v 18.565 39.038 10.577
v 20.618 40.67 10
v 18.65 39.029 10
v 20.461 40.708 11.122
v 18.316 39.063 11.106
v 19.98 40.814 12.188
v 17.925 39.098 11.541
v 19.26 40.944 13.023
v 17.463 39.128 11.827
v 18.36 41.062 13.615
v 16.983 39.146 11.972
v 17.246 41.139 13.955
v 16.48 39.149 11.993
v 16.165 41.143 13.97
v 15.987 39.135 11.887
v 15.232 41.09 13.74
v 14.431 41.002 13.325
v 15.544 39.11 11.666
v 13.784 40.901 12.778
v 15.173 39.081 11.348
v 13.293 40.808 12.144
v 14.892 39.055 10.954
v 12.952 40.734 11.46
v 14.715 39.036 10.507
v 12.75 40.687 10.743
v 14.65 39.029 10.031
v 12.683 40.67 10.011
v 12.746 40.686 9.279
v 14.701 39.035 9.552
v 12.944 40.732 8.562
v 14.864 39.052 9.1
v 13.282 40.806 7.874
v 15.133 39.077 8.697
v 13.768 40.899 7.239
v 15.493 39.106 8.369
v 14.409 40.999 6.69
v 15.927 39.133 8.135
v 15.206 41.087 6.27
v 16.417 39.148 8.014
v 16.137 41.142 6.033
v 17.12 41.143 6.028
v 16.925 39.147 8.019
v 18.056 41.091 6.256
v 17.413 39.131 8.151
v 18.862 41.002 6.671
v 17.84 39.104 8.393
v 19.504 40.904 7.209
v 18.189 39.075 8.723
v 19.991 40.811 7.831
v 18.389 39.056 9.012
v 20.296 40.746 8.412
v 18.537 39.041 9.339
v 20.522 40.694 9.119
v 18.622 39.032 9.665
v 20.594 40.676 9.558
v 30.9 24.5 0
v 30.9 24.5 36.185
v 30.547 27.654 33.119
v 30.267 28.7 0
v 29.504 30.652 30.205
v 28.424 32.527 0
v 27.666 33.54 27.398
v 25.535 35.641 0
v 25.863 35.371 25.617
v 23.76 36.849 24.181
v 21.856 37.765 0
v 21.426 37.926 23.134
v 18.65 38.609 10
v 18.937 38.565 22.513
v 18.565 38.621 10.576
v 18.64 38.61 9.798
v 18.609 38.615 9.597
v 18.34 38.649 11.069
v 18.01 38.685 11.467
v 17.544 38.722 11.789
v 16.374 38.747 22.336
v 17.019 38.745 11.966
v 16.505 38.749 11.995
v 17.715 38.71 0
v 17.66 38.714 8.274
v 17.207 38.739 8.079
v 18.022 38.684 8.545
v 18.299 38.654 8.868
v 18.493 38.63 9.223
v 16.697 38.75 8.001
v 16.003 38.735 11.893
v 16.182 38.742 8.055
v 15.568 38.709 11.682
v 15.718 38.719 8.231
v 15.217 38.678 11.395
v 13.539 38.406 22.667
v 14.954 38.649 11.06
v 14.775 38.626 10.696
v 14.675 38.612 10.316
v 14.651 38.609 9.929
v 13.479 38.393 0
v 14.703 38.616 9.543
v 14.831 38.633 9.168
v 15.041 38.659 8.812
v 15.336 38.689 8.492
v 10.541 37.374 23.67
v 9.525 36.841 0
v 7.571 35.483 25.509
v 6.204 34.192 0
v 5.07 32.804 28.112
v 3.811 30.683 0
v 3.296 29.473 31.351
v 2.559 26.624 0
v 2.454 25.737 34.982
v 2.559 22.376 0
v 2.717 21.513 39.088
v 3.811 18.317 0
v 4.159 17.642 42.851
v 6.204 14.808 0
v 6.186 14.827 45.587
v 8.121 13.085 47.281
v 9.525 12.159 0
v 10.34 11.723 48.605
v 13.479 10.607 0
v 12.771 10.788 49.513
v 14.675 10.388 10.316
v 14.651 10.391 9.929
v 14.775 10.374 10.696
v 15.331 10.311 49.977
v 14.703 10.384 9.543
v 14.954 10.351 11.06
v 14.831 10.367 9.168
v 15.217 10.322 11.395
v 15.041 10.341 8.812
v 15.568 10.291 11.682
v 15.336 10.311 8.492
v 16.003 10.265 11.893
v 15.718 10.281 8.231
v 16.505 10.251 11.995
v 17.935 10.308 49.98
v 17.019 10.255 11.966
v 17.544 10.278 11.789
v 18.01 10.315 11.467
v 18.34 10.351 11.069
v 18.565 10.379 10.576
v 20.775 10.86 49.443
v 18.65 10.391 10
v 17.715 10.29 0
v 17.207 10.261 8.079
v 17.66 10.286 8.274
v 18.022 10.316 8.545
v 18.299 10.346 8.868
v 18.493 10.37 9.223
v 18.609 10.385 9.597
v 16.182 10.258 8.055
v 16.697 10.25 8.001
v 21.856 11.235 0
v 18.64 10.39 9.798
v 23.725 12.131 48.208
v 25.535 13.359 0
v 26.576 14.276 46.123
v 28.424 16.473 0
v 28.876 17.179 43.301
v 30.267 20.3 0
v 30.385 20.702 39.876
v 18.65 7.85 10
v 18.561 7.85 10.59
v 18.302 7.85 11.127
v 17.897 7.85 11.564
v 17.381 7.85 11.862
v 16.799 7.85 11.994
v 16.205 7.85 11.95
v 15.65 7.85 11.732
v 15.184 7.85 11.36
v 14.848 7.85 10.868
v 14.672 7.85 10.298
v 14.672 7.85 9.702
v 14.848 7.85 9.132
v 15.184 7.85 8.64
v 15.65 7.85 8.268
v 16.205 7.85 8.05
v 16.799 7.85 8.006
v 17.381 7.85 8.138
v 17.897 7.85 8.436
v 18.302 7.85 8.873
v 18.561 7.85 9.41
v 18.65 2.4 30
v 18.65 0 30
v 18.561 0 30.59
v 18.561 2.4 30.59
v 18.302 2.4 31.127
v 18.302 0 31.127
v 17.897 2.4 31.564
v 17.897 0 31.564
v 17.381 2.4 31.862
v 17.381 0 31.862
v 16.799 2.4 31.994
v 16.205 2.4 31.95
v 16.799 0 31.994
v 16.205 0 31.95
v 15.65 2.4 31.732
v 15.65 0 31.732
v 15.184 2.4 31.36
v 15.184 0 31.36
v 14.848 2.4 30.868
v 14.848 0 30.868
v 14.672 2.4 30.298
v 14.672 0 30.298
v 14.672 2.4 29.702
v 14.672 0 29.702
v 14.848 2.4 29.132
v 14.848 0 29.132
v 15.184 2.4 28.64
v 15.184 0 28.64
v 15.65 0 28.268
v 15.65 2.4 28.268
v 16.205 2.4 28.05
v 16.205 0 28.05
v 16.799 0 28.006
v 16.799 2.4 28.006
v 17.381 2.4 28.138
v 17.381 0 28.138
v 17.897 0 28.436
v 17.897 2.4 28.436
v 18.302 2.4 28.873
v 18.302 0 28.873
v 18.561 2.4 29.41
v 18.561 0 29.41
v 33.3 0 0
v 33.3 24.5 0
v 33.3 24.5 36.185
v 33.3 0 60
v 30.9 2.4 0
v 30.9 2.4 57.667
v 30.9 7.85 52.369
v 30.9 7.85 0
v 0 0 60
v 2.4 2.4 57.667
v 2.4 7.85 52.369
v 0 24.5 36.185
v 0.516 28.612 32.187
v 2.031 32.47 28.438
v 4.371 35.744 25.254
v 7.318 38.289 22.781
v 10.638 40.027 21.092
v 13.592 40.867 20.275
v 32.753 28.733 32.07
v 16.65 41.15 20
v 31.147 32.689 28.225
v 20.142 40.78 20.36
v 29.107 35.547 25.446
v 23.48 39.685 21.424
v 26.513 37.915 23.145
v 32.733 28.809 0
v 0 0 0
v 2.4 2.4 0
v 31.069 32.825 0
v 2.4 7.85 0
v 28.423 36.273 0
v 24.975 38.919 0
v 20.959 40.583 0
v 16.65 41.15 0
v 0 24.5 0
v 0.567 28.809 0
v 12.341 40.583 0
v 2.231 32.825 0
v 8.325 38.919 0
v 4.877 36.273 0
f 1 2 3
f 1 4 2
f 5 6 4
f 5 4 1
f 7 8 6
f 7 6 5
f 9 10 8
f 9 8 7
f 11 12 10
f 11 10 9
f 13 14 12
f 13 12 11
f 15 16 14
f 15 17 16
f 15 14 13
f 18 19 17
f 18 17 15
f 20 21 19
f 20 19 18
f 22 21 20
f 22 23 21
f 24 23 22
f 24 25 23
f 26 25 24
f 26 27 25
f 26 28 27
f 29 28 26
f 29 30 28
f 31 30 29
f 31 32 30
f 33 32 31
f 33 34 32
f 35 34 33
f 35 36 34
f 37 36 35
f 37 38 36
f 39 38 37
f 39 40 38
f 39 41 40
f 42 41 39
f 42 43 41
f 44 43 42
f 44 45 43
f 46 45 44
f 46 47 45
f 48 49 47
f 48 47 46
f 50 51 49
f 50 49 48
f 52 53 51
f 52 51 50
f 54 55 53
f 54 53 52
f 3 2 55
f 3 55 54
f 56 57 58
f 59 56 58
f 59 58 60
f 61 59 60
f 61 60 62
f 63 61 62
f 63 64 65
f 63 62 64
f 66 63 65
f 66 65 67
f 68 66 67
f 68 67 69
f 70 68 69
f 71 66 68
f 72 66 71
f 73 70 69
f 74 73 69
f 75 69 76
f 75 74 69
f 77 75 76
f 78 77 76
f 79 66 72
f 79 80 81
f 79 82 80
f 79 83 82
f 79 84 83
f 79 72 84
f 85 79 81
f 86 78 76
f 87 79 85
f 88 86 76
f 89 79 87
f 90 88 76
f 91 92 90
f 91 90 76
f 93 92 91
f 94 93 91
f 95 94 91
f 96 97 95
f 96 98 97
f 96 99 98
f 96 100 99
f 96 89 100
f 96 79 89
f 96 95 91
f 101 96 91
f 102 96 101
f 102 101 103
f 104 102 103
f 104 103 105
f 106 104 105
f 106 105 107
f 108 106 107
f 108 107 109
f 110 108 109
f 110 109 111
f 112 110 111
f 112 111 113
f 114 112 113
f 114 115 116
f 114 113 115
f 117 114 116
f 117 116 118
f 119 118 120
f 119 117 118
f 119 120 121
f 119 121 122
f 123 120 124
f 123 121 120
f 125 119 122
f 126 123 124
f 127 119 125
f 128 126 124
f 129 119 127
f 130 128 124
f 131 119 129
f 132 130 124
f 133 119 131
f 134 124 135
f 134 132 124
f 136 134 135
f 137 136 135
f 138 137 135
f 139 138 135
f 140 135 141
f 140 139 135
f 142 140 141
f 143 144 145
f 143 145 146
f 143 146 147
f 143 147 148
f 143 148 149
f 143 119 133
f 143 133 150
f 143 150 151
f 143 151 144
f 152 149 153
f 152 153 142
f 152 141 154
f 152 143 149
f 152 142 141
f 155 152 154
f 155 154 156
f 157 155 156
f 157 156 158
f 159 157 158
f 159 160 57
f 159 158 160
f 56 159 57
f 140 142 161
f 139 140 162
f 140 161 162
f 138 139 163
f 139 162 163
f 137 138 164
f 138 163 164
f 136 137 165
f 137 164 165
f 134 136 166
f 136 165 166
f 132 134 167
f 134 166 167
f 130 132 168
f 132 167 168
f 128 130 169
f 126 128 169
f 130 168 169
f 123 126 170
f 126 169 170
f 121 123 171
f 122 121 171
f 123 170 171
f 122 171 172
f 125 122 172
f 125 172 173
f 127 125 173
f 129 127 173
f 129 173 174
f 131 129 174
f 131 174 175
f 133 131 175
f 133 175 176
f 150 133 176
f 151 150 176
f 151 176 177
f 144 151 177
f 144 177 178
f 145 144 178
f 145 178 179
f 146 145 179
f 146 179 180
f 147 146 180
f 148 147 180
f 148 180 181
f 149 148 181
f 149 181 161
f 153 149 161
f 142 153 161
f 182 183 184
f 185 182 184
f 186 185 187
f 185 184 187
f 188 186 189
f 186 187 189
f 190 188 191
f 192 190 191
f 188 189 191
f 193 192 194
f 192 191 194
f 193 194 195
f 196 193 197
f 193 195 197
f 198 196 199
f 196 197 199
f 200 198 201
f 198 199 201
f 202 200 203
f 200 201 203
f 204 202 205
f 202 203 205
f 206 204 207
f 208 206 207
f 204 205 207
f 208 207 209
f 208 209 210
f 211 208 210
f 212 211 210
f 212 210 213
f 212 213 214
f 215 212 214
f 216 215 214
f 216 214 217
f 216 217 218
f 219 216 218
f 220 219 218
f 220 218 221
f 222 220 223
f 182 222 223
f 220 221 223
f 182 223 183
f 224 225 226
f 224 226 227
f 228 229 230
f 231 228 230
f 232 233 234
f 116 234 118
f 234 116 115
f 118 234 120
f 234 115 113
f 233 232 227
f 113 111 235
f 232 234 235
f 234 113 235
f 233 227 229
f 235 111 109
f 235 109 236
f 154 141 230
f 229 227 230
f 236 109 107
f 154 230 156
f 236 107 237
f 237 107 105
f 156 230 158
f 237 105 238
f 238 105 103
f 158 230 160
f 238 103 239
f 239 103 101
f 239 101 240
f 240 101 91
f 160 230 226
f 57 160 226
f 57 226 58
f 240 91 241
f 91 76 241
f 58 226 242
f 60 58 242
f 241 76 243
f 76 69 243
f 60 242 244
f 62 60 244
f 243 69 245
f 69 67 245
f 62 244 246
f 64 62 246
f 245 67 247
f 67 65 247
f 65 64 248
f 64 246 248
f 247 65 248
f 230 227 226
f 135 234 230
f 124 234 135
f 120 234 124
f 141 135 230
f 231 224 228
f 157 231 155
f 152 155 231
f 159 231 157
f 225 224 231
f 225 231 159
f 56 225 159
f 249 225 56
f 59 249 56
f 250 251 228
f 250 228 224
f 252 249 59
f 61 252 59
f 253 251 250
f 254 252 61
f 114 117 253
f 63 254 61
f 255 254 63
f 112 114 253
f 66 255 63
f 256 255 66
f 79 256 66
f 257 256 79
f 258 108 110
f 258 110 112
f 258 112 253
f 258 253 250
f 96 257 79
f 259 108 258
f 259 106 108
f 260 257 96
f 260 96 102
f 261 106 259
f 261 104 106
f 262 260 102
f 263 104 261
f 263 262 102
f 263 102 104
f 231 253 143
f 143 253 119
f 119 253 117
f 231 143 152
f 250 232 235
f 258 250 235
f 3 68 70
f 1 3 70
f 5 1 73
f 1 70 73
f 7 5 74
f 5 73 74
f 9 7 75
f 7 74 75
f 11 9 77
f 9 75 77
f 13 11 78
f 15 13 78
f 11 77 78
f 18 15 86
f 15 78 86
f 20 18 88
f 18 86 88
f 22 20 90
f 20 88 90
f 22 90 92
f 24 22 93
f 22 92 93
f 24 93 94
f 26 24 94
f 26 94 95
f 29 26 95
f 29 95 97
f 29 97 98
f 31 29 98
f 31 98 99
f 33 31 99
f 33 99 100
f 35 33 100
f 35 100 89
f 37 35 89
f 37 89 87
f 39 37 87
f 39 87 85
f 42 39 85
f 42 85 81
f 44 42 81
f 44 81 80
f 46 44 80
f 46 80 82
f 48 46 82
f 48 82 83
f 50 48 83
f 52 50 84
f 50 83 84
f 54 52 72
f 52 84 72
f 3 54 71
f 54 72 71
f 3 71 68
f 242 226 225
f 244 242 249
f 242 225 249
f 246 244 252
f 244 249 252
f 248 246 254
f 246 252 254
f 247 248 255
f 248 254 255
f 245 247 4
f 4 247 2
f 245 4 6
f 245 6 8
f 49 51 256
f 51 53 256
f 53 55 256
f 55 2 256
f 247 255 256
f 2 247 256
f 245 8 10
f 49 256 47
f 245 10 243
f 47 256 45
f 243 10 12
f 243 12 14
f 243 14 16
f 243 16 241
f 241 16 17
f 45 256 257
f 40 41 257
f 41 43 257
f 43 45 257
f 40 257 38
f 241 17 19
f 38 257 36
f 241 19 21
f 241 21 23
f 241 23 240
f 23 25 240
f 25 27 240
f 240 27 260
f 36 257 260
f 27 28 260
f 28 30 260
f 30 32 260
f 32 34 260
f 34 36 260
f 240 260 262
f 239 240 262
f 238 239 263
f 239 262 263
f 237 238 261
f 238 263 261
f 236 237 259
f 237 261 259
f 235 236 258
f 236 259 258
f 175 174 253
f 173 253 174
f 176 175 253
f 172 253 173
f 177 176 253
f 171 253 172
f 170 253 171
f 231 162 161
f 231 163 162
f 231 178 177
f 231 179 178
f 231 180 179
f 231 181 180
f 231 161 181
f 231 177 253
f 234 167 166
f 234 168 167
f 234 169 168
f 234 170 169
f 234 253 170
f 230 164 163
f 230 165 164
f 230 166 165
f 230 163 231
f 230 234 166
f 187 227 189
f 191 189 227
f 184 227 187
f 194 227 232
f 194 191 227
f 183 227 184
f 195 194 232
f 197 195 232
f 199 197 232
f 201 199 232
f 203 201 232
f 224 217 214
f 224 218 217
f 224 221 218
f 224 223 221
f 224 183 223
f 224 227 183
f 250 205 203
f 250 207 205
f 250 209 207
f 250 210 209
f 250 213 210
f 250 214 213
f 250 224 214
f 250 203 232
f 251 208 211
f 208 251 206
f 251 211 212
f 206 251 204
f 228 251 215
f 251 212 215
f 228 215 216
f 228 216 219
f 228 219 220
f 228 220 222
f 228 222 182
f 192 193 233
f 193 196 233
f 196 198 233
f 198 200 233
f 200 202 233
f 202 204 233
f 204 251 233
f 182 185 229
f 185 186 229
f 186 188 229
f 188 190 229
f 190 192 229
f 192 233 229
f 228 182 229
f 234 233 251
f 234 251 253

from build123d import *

# Parameters (mm, degrees)
SKETCH_R        = 14.25
PAD_DEPTH       = 60
SKETCH001_W     = 28.5
SKETCH001_H     = 5.45
POCKET_DEPTH    = 60.001
SKETCH002_R     = 2
POCKET001_DEPTH = 2.4
POCKET002_DEPTH = 33.301
SKETCH004_R     = 2
POCKET003_DEPTH = 33.301
CHAMFER_SIZE2   = 2
CHAMFER_SIZE    = 2


with BuildPart() as part:
    # Sketch → Pad (new body)
    with BuildSketch(Plane.XY):
        with BuildLine():
            Line((0, 0), (0, 24.5))
            ThreePointArc((33.3, 24.5), (16.65, 41.15), (0, 24.5))
            Line((33.3, 24.5), (33.3, 0))
            Line((33.3, 0), (0, 0))
        make_face()
        with Locations((16.65, 24.5)):
            Circle(SKETCH_R, mode=Mode.SUBTRACT)
    extrude(amount=PAD_DEPTH)

    # Sketch001 (on Face7 of Pad) → Pocket (cut, through all)
    with BuildSketch(Plane.XY.offset(60)):
        with Locations((16.65, 5.125)):
            Rectangle(SKETCH001_W, SKETCH001_H)
    extrude(amount=-POCKET_DEPTH, mode=Mode.SUBTRACT)

    # Sketch002 (on Face2 of Pocket) → Pocket001 (cut)
    with BuildSketch(Plane.XZ):
        with Locations((16.65, 30)):
            Circle(SKETCH002_R)
    extrude(amount=-POCKET001_DEPTH, mode=Mode.SUBTRACT)

    # Sketch003 (on DatumPlane) → Pocket002 (cut, through all)
    with BuildSketch(Plane.YZ.offset(33.3)):
        Polygon((0, 60), (41.15, 20), (41.15, 60), align=None)
    extrude(amount=-POCKET002_DEPTH, mode=Mode.SUBTRACT)

    # Sketch004 (on Face9 of Pocket002) → Pocket003 (cut, through all)
    with BuildSketch(Plane.XZ.offset(-7.85)):
        with Locations((16.65, 10)):
            Circle(SKETCH004_R)
    extrude(amount=-POCKET003_DEPTH, mode=Mode.SUBTRACT)

    # Chamfer
    chamfer_edges = [part.edges().sort_by_distance(p)[0] for p in [
        (14.65, 41.029443, 10),
    ]]
    chamfer_side = part.faces().sort_by_distance((16.65, 41.15, 18.092345))[0]
    chamfer(chamfer_edges, length=CHAMFER_SIZE, length2=CHAMFER_SIZE2, reference=chamfer_side)


solid = part.part
